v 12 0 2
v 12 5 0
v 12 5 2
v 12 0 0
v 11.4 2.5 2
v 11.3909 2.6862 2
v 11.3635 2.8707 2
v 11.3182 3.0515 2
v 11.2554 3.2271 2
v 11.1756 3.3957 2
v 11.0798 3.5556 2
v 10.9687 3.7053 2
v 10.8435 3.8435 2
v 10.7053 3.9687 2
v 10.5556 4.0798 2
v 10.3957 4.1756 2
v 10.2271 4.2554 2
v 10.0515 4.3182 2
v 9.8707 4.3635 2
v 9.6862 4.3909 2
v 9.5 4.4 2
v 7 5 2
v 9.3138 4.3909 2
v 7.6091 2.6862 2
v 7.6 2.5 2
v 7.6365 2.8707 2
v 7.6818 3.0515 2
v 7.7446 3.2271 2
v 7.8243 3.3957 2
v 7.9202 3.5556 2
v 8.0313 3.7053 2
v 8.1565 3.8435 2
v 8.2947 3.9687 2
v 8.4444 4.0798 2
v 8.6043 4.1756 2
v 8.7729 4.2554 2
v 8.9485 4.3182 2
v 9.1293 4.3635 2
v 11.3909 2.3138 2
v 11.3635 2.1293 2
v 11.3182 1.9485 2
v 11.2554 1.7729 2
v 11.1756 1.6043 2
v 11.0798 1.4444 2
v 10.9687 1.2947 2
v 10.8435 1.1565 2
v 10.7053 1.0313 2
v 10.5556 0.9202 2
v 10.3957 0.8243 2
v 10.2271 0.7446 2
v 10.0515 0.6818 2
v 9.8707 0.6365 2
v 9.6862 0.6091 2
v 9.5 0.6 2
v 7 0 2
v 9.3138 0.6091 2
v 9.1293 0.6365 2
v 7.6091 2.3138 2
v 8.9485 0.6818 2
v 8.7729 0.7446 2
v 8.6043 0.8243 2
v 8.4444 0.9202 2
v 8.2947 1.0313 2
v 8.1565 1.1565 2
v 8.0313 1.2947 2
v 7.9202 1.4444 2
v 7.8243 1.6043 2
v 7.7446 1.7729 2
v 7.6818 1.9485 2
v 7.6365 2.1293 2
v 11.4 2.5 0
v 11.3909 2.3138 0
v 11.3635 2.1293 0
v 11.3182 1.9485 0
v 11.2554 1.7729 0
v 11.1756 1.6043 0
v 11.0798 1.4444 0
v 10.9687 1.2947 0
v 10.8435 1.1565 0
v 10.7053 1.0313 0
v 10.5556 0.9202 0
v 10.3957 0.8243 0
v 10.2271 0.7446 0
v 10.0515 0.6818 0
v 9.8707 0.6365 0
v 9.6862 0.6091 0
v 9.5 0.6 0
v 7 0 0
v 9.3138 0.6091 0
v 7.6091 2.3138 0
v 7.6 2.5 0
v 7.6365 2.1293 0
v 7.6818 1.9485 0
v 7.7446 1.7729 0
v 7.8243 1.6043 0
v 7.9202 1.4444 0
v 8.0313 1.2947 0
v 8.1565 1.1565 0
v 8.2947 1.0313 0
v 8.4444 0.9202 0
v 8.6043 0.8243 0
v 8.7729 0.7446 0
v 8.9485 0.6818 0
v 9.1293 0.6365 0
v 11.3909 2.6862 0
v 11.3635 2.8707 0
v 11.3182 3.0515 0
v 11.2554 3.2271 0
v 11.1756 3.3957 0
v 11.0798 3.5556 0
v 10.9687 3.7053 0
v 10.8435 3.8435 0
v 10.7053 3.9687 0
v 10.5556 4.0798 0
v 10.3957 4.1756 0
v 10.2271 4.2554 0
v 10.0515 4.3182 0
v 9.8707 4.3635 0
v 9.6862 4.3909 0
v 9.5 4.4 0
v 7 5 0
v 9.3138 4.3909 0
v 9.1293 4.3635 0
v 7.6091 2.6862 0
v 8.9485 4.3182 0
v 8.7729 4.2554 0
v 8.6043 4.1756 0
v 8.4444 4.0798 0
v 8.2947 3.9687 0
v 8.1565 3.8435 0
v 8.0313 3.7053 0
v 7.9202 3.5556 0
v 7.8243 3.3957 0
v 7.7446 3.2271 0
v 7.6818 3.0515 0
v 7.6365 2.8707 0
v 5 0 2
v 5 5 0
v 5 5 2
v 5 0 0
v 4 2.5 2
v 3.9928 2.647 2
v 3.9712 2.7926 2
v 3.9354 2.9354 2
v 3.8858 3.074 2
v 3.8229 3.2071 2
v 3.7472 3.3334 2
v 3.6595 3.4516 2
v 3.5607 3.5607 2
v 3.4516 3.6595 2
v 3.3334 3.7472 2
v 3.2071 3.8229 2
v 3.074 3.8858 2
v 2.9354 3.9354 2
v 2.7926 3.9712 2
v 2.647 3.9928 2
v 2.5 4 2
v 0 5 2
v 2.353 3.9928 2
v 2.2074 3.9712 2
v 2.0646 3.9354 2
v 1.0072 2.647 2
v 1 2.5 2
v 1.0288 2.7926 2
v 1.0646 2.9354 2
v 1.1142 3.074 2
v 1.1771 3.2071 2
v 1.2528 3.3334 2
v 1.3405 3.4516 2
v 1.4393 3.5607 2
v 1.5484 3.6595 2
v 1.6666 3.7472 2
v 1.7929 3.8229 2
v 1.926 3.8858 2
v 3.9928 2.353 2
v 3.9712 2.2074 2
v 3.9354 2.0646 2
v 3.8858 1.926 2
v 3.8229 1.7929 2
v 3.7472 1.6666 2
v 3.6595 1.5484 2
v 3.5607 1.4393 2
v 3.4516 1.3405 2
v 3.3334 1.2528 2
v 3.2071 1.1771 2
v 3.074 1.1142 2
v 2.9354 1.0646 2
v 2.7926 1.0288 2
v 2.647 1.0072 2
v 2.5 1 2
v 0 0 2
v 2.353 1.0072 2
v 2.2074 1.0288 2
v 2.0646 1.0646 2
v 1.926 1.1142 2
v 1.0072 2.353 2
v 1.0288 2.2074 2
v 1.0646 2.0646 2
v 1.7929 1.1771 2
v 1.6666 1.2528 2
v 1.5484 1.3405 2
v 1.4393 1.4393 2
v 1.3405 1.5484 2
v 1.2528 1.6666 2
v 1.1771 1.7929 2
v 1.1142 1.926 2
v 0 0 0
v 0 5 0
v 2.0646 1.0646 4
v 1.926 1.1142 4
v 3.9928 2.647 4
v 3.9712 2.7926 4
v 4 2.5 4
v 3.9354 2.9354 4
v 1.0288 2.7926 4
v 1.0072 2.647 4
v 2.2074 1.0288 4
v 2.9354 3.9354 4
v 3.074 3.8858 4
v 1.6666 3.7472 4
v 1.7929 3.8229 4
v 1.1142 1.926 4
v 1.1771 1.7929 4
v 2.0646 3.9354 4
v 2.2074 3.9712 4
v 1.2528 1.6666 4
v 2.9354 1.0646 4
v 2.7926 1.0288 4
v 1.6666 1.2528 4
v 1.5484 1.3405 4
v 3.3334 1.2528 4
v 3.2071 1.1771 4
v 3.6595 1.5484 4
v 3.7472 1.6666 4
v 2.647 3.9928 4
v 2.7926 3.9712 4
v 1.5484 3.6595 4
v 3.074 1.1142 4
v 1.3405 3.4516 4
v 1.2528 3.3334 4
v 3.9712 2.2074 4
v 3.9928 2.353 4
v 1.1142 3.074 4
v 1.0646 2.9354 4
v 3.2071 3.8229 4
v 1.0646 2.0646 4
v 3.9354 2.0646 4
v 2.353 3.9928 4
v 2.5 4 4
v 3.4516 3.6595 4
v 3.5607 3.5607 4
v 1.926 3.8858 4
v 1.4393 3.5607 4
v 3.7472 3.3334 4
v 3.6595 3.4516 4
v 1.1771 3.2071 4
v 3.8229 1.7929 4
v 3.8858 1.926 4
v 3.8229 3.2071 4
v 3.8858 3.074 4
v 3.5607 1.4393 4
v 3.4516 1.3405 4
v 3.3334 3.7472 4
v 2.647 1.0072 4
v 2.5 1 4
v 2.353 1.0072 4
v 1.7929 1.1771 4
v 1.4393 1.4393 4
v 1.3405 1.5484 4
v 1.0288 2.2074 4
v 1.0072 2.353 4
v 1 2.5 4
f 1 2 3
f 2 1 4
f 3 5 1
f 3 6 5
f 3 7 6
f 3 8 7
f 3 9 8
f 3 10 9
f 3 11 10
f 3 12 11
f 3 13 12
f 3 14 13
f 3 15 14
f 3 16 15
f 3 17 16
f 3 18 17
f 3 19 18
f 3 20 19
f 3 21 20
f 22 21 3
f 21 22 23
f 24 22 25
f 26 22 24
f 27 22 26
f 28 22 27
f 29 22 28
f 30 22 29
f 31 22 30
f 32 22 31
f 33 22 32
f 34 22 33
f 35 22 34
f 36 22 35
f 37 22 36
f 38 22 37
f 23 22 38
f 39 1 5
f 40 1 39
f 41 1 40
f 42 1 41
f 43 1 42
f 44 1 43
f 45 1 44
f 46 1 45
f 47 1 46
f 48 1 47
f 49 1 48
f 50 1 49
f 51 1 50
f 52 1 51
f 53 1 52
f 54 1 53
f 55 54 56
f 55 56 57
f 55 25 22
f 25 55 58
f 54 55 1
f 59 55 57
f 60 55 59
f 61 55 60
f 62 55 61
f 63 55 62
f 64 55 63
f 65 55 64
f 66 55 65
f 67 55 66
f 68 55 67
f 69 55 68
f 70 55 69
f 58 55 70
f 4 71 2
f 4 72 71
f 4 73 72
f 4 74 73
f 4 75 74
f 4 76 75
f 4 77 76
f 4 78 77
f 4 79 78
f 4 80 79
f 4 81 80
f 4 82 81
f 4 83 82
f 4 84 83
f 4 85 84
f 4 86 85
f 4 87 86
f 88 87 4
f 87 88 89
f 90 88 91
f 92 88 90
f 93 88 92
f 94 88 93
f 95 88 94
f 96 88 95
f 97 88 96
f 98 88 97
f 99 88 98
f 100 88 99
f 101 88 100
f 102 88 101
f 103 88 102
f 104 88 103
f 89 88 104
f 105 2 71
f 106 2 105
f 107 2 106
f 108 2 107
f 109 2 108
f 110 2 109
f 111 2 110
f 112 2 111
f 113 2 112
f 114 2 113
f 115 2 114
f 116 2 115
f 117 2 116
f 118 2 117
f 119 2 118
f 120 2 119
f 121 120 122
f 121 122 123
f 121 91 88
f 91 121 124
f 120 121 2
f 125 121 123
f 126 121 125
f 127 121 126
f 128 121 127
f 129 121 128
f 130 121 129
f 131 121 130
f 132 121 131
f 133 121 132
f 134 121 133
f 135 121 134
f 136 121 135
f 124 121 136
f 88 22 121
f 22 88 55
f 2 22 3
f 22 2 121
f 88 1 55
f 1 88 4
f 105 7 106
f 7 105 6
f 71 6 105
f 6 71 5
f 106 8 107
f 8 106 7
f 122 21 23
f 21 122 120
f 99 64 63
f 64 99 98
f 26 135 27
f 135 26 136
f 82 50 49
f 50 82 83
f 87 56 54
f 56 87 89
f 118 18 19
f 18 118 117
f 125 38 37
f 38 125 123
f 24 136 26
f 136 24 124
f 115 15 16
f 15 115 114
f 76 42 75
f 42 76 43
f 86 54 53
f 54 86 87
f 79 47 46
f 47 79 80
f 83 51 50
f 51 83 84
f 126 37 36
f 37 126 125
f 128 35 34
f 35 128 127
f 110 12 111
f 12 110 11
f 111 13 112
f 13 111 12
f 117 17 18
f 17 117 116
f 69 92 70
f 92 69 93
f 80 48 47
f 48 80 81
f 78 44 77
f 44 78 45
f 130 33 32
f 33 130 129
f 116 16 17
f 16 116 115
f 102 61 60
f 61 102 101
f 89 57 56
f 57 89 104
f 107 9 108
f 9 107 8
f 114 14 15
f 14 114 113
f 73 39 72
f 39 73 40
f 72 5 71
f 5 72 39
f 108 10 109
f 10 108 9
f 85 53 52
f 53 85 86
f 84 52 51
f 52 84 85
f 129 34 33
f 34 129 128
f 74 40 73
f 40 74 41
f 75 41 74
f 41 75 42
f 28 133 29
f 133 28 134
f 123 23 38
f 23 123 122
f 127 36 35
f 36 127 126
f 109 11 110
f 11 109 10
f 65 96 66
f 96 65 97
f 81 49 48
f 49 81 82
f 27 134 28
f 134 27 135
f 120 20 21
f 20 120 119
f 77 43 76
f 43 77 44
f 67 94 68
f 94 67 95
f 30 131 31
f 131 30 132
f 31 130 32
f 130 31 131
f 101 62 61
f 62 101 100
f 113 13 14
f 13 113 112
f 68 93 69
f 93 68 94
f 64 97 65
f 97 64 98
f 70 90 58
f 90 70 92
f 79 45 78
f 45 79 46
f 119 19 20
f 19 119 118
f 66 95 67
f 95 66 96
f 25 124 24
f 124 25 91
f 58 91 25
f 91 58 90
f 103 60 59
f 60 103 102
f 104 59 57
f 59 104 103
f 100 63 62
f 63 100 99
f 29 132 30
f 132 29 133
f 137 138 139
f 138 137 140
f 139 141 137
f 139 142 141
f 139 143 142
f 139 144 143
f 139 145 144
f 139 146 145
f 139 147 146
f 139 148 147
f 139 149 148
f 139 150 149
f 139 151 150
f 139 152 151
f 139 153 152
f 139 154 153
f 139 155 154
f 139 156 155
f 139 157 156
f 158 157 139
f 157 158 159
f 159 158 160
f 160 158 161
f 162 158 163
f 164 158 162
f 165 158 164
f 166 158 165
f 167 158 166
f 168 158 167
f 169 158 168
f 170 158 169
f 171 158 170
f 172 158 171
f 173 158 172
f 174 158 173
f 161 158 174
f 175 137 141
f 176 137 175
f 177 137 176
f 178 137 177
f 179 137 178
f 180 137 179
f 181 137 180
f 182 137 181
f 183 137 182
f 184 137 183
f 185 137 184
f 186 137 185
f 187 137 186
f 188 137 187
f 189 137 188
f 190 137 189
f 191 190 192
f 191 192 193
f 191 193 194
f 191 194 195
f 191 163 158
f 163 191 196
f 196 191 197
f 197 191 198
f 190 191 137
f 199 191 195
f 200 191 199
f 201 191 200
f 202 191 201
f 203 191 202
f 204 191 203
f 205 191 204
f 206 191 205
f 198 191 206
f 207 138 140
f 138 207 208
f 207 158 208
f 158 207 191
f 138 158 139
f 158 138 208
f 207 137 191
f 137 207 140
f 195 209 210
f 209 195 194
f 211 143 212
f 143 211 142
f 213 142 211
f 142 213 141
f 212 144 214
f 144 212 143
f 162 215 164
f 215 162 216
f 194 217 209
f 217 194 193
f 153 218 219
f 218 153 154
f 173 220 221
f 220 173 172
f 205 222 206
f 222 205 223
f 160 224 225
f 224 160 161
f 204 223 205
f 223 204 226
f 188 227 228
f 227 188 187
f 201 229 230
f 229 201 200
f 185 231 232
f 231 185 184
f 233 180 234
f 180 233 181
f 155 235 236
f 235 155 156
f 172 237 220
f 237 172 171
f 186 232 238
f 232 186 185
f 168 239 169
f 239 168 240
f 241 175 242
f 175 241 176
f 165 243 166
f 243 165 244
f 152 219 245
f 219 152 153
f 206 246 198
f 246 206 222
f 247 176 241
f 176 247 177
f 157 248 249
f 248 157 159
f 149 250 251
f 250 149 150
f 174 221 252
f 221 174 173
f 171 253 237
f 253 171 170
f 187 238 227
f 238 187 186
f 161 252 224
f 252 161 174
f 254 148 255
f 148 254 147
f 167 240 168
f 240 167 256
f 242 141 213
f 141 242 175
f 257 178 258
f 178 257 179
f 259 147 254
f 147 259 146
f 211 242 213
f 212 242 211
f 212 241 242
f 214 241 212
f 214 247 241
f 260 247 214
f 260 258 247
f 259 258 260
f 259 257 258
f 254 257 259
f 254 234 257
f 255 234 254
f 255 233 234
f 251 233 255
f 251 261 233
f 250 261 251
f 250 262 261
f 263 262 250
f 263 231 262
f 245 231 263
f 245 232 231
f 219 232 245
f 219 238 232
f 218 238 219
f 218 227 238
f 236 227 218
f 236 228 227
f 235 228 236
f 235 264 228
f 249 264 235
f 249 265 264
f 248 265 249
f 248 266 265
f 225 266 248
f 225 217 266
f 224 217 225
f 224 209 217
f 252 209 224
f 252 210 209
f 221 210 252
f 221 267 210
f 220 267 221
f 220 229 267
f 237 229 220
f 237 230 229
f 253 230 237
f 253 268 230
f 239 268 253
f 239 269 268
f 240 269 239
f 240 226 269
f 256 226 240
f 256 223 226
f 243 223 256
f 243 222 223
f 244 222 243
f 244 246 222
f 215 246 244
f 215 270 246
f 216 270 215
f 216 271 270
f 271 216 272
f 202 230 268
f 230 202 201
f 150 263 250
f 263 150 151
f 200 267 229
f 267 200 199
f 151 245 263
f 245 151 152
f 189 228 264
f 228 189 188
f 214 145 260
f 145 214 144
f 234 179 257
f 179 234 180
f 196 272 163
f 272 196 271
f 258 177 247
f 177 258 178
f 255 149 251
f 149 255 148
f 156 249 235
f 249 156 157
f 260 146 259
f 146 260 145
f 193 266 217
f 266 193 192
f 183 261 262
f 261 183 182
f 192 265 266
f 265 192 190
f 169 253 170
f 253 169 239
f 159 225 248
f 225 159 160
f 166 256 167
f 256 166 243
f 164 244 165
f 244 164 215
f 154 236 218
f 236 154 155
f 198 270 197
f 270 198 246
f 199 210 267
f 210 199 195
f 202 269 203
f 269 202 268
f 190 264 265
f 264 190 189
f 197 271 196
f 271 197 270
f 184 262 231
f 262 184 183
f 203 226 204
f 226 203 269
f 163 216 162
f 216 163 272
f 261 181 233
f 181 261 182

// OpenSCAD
$fn = 64;
cube([5,5,2]);
translate([2.5,2.5,0]){
	cylinder(4,1.5,1.5);
}

translate([7,0,0]){
	difference(){
		cube([5,5,2]);
		translate([2.5,2.5,0]){
			cylinder(4,1.9,1.9);
		}
	}
}
